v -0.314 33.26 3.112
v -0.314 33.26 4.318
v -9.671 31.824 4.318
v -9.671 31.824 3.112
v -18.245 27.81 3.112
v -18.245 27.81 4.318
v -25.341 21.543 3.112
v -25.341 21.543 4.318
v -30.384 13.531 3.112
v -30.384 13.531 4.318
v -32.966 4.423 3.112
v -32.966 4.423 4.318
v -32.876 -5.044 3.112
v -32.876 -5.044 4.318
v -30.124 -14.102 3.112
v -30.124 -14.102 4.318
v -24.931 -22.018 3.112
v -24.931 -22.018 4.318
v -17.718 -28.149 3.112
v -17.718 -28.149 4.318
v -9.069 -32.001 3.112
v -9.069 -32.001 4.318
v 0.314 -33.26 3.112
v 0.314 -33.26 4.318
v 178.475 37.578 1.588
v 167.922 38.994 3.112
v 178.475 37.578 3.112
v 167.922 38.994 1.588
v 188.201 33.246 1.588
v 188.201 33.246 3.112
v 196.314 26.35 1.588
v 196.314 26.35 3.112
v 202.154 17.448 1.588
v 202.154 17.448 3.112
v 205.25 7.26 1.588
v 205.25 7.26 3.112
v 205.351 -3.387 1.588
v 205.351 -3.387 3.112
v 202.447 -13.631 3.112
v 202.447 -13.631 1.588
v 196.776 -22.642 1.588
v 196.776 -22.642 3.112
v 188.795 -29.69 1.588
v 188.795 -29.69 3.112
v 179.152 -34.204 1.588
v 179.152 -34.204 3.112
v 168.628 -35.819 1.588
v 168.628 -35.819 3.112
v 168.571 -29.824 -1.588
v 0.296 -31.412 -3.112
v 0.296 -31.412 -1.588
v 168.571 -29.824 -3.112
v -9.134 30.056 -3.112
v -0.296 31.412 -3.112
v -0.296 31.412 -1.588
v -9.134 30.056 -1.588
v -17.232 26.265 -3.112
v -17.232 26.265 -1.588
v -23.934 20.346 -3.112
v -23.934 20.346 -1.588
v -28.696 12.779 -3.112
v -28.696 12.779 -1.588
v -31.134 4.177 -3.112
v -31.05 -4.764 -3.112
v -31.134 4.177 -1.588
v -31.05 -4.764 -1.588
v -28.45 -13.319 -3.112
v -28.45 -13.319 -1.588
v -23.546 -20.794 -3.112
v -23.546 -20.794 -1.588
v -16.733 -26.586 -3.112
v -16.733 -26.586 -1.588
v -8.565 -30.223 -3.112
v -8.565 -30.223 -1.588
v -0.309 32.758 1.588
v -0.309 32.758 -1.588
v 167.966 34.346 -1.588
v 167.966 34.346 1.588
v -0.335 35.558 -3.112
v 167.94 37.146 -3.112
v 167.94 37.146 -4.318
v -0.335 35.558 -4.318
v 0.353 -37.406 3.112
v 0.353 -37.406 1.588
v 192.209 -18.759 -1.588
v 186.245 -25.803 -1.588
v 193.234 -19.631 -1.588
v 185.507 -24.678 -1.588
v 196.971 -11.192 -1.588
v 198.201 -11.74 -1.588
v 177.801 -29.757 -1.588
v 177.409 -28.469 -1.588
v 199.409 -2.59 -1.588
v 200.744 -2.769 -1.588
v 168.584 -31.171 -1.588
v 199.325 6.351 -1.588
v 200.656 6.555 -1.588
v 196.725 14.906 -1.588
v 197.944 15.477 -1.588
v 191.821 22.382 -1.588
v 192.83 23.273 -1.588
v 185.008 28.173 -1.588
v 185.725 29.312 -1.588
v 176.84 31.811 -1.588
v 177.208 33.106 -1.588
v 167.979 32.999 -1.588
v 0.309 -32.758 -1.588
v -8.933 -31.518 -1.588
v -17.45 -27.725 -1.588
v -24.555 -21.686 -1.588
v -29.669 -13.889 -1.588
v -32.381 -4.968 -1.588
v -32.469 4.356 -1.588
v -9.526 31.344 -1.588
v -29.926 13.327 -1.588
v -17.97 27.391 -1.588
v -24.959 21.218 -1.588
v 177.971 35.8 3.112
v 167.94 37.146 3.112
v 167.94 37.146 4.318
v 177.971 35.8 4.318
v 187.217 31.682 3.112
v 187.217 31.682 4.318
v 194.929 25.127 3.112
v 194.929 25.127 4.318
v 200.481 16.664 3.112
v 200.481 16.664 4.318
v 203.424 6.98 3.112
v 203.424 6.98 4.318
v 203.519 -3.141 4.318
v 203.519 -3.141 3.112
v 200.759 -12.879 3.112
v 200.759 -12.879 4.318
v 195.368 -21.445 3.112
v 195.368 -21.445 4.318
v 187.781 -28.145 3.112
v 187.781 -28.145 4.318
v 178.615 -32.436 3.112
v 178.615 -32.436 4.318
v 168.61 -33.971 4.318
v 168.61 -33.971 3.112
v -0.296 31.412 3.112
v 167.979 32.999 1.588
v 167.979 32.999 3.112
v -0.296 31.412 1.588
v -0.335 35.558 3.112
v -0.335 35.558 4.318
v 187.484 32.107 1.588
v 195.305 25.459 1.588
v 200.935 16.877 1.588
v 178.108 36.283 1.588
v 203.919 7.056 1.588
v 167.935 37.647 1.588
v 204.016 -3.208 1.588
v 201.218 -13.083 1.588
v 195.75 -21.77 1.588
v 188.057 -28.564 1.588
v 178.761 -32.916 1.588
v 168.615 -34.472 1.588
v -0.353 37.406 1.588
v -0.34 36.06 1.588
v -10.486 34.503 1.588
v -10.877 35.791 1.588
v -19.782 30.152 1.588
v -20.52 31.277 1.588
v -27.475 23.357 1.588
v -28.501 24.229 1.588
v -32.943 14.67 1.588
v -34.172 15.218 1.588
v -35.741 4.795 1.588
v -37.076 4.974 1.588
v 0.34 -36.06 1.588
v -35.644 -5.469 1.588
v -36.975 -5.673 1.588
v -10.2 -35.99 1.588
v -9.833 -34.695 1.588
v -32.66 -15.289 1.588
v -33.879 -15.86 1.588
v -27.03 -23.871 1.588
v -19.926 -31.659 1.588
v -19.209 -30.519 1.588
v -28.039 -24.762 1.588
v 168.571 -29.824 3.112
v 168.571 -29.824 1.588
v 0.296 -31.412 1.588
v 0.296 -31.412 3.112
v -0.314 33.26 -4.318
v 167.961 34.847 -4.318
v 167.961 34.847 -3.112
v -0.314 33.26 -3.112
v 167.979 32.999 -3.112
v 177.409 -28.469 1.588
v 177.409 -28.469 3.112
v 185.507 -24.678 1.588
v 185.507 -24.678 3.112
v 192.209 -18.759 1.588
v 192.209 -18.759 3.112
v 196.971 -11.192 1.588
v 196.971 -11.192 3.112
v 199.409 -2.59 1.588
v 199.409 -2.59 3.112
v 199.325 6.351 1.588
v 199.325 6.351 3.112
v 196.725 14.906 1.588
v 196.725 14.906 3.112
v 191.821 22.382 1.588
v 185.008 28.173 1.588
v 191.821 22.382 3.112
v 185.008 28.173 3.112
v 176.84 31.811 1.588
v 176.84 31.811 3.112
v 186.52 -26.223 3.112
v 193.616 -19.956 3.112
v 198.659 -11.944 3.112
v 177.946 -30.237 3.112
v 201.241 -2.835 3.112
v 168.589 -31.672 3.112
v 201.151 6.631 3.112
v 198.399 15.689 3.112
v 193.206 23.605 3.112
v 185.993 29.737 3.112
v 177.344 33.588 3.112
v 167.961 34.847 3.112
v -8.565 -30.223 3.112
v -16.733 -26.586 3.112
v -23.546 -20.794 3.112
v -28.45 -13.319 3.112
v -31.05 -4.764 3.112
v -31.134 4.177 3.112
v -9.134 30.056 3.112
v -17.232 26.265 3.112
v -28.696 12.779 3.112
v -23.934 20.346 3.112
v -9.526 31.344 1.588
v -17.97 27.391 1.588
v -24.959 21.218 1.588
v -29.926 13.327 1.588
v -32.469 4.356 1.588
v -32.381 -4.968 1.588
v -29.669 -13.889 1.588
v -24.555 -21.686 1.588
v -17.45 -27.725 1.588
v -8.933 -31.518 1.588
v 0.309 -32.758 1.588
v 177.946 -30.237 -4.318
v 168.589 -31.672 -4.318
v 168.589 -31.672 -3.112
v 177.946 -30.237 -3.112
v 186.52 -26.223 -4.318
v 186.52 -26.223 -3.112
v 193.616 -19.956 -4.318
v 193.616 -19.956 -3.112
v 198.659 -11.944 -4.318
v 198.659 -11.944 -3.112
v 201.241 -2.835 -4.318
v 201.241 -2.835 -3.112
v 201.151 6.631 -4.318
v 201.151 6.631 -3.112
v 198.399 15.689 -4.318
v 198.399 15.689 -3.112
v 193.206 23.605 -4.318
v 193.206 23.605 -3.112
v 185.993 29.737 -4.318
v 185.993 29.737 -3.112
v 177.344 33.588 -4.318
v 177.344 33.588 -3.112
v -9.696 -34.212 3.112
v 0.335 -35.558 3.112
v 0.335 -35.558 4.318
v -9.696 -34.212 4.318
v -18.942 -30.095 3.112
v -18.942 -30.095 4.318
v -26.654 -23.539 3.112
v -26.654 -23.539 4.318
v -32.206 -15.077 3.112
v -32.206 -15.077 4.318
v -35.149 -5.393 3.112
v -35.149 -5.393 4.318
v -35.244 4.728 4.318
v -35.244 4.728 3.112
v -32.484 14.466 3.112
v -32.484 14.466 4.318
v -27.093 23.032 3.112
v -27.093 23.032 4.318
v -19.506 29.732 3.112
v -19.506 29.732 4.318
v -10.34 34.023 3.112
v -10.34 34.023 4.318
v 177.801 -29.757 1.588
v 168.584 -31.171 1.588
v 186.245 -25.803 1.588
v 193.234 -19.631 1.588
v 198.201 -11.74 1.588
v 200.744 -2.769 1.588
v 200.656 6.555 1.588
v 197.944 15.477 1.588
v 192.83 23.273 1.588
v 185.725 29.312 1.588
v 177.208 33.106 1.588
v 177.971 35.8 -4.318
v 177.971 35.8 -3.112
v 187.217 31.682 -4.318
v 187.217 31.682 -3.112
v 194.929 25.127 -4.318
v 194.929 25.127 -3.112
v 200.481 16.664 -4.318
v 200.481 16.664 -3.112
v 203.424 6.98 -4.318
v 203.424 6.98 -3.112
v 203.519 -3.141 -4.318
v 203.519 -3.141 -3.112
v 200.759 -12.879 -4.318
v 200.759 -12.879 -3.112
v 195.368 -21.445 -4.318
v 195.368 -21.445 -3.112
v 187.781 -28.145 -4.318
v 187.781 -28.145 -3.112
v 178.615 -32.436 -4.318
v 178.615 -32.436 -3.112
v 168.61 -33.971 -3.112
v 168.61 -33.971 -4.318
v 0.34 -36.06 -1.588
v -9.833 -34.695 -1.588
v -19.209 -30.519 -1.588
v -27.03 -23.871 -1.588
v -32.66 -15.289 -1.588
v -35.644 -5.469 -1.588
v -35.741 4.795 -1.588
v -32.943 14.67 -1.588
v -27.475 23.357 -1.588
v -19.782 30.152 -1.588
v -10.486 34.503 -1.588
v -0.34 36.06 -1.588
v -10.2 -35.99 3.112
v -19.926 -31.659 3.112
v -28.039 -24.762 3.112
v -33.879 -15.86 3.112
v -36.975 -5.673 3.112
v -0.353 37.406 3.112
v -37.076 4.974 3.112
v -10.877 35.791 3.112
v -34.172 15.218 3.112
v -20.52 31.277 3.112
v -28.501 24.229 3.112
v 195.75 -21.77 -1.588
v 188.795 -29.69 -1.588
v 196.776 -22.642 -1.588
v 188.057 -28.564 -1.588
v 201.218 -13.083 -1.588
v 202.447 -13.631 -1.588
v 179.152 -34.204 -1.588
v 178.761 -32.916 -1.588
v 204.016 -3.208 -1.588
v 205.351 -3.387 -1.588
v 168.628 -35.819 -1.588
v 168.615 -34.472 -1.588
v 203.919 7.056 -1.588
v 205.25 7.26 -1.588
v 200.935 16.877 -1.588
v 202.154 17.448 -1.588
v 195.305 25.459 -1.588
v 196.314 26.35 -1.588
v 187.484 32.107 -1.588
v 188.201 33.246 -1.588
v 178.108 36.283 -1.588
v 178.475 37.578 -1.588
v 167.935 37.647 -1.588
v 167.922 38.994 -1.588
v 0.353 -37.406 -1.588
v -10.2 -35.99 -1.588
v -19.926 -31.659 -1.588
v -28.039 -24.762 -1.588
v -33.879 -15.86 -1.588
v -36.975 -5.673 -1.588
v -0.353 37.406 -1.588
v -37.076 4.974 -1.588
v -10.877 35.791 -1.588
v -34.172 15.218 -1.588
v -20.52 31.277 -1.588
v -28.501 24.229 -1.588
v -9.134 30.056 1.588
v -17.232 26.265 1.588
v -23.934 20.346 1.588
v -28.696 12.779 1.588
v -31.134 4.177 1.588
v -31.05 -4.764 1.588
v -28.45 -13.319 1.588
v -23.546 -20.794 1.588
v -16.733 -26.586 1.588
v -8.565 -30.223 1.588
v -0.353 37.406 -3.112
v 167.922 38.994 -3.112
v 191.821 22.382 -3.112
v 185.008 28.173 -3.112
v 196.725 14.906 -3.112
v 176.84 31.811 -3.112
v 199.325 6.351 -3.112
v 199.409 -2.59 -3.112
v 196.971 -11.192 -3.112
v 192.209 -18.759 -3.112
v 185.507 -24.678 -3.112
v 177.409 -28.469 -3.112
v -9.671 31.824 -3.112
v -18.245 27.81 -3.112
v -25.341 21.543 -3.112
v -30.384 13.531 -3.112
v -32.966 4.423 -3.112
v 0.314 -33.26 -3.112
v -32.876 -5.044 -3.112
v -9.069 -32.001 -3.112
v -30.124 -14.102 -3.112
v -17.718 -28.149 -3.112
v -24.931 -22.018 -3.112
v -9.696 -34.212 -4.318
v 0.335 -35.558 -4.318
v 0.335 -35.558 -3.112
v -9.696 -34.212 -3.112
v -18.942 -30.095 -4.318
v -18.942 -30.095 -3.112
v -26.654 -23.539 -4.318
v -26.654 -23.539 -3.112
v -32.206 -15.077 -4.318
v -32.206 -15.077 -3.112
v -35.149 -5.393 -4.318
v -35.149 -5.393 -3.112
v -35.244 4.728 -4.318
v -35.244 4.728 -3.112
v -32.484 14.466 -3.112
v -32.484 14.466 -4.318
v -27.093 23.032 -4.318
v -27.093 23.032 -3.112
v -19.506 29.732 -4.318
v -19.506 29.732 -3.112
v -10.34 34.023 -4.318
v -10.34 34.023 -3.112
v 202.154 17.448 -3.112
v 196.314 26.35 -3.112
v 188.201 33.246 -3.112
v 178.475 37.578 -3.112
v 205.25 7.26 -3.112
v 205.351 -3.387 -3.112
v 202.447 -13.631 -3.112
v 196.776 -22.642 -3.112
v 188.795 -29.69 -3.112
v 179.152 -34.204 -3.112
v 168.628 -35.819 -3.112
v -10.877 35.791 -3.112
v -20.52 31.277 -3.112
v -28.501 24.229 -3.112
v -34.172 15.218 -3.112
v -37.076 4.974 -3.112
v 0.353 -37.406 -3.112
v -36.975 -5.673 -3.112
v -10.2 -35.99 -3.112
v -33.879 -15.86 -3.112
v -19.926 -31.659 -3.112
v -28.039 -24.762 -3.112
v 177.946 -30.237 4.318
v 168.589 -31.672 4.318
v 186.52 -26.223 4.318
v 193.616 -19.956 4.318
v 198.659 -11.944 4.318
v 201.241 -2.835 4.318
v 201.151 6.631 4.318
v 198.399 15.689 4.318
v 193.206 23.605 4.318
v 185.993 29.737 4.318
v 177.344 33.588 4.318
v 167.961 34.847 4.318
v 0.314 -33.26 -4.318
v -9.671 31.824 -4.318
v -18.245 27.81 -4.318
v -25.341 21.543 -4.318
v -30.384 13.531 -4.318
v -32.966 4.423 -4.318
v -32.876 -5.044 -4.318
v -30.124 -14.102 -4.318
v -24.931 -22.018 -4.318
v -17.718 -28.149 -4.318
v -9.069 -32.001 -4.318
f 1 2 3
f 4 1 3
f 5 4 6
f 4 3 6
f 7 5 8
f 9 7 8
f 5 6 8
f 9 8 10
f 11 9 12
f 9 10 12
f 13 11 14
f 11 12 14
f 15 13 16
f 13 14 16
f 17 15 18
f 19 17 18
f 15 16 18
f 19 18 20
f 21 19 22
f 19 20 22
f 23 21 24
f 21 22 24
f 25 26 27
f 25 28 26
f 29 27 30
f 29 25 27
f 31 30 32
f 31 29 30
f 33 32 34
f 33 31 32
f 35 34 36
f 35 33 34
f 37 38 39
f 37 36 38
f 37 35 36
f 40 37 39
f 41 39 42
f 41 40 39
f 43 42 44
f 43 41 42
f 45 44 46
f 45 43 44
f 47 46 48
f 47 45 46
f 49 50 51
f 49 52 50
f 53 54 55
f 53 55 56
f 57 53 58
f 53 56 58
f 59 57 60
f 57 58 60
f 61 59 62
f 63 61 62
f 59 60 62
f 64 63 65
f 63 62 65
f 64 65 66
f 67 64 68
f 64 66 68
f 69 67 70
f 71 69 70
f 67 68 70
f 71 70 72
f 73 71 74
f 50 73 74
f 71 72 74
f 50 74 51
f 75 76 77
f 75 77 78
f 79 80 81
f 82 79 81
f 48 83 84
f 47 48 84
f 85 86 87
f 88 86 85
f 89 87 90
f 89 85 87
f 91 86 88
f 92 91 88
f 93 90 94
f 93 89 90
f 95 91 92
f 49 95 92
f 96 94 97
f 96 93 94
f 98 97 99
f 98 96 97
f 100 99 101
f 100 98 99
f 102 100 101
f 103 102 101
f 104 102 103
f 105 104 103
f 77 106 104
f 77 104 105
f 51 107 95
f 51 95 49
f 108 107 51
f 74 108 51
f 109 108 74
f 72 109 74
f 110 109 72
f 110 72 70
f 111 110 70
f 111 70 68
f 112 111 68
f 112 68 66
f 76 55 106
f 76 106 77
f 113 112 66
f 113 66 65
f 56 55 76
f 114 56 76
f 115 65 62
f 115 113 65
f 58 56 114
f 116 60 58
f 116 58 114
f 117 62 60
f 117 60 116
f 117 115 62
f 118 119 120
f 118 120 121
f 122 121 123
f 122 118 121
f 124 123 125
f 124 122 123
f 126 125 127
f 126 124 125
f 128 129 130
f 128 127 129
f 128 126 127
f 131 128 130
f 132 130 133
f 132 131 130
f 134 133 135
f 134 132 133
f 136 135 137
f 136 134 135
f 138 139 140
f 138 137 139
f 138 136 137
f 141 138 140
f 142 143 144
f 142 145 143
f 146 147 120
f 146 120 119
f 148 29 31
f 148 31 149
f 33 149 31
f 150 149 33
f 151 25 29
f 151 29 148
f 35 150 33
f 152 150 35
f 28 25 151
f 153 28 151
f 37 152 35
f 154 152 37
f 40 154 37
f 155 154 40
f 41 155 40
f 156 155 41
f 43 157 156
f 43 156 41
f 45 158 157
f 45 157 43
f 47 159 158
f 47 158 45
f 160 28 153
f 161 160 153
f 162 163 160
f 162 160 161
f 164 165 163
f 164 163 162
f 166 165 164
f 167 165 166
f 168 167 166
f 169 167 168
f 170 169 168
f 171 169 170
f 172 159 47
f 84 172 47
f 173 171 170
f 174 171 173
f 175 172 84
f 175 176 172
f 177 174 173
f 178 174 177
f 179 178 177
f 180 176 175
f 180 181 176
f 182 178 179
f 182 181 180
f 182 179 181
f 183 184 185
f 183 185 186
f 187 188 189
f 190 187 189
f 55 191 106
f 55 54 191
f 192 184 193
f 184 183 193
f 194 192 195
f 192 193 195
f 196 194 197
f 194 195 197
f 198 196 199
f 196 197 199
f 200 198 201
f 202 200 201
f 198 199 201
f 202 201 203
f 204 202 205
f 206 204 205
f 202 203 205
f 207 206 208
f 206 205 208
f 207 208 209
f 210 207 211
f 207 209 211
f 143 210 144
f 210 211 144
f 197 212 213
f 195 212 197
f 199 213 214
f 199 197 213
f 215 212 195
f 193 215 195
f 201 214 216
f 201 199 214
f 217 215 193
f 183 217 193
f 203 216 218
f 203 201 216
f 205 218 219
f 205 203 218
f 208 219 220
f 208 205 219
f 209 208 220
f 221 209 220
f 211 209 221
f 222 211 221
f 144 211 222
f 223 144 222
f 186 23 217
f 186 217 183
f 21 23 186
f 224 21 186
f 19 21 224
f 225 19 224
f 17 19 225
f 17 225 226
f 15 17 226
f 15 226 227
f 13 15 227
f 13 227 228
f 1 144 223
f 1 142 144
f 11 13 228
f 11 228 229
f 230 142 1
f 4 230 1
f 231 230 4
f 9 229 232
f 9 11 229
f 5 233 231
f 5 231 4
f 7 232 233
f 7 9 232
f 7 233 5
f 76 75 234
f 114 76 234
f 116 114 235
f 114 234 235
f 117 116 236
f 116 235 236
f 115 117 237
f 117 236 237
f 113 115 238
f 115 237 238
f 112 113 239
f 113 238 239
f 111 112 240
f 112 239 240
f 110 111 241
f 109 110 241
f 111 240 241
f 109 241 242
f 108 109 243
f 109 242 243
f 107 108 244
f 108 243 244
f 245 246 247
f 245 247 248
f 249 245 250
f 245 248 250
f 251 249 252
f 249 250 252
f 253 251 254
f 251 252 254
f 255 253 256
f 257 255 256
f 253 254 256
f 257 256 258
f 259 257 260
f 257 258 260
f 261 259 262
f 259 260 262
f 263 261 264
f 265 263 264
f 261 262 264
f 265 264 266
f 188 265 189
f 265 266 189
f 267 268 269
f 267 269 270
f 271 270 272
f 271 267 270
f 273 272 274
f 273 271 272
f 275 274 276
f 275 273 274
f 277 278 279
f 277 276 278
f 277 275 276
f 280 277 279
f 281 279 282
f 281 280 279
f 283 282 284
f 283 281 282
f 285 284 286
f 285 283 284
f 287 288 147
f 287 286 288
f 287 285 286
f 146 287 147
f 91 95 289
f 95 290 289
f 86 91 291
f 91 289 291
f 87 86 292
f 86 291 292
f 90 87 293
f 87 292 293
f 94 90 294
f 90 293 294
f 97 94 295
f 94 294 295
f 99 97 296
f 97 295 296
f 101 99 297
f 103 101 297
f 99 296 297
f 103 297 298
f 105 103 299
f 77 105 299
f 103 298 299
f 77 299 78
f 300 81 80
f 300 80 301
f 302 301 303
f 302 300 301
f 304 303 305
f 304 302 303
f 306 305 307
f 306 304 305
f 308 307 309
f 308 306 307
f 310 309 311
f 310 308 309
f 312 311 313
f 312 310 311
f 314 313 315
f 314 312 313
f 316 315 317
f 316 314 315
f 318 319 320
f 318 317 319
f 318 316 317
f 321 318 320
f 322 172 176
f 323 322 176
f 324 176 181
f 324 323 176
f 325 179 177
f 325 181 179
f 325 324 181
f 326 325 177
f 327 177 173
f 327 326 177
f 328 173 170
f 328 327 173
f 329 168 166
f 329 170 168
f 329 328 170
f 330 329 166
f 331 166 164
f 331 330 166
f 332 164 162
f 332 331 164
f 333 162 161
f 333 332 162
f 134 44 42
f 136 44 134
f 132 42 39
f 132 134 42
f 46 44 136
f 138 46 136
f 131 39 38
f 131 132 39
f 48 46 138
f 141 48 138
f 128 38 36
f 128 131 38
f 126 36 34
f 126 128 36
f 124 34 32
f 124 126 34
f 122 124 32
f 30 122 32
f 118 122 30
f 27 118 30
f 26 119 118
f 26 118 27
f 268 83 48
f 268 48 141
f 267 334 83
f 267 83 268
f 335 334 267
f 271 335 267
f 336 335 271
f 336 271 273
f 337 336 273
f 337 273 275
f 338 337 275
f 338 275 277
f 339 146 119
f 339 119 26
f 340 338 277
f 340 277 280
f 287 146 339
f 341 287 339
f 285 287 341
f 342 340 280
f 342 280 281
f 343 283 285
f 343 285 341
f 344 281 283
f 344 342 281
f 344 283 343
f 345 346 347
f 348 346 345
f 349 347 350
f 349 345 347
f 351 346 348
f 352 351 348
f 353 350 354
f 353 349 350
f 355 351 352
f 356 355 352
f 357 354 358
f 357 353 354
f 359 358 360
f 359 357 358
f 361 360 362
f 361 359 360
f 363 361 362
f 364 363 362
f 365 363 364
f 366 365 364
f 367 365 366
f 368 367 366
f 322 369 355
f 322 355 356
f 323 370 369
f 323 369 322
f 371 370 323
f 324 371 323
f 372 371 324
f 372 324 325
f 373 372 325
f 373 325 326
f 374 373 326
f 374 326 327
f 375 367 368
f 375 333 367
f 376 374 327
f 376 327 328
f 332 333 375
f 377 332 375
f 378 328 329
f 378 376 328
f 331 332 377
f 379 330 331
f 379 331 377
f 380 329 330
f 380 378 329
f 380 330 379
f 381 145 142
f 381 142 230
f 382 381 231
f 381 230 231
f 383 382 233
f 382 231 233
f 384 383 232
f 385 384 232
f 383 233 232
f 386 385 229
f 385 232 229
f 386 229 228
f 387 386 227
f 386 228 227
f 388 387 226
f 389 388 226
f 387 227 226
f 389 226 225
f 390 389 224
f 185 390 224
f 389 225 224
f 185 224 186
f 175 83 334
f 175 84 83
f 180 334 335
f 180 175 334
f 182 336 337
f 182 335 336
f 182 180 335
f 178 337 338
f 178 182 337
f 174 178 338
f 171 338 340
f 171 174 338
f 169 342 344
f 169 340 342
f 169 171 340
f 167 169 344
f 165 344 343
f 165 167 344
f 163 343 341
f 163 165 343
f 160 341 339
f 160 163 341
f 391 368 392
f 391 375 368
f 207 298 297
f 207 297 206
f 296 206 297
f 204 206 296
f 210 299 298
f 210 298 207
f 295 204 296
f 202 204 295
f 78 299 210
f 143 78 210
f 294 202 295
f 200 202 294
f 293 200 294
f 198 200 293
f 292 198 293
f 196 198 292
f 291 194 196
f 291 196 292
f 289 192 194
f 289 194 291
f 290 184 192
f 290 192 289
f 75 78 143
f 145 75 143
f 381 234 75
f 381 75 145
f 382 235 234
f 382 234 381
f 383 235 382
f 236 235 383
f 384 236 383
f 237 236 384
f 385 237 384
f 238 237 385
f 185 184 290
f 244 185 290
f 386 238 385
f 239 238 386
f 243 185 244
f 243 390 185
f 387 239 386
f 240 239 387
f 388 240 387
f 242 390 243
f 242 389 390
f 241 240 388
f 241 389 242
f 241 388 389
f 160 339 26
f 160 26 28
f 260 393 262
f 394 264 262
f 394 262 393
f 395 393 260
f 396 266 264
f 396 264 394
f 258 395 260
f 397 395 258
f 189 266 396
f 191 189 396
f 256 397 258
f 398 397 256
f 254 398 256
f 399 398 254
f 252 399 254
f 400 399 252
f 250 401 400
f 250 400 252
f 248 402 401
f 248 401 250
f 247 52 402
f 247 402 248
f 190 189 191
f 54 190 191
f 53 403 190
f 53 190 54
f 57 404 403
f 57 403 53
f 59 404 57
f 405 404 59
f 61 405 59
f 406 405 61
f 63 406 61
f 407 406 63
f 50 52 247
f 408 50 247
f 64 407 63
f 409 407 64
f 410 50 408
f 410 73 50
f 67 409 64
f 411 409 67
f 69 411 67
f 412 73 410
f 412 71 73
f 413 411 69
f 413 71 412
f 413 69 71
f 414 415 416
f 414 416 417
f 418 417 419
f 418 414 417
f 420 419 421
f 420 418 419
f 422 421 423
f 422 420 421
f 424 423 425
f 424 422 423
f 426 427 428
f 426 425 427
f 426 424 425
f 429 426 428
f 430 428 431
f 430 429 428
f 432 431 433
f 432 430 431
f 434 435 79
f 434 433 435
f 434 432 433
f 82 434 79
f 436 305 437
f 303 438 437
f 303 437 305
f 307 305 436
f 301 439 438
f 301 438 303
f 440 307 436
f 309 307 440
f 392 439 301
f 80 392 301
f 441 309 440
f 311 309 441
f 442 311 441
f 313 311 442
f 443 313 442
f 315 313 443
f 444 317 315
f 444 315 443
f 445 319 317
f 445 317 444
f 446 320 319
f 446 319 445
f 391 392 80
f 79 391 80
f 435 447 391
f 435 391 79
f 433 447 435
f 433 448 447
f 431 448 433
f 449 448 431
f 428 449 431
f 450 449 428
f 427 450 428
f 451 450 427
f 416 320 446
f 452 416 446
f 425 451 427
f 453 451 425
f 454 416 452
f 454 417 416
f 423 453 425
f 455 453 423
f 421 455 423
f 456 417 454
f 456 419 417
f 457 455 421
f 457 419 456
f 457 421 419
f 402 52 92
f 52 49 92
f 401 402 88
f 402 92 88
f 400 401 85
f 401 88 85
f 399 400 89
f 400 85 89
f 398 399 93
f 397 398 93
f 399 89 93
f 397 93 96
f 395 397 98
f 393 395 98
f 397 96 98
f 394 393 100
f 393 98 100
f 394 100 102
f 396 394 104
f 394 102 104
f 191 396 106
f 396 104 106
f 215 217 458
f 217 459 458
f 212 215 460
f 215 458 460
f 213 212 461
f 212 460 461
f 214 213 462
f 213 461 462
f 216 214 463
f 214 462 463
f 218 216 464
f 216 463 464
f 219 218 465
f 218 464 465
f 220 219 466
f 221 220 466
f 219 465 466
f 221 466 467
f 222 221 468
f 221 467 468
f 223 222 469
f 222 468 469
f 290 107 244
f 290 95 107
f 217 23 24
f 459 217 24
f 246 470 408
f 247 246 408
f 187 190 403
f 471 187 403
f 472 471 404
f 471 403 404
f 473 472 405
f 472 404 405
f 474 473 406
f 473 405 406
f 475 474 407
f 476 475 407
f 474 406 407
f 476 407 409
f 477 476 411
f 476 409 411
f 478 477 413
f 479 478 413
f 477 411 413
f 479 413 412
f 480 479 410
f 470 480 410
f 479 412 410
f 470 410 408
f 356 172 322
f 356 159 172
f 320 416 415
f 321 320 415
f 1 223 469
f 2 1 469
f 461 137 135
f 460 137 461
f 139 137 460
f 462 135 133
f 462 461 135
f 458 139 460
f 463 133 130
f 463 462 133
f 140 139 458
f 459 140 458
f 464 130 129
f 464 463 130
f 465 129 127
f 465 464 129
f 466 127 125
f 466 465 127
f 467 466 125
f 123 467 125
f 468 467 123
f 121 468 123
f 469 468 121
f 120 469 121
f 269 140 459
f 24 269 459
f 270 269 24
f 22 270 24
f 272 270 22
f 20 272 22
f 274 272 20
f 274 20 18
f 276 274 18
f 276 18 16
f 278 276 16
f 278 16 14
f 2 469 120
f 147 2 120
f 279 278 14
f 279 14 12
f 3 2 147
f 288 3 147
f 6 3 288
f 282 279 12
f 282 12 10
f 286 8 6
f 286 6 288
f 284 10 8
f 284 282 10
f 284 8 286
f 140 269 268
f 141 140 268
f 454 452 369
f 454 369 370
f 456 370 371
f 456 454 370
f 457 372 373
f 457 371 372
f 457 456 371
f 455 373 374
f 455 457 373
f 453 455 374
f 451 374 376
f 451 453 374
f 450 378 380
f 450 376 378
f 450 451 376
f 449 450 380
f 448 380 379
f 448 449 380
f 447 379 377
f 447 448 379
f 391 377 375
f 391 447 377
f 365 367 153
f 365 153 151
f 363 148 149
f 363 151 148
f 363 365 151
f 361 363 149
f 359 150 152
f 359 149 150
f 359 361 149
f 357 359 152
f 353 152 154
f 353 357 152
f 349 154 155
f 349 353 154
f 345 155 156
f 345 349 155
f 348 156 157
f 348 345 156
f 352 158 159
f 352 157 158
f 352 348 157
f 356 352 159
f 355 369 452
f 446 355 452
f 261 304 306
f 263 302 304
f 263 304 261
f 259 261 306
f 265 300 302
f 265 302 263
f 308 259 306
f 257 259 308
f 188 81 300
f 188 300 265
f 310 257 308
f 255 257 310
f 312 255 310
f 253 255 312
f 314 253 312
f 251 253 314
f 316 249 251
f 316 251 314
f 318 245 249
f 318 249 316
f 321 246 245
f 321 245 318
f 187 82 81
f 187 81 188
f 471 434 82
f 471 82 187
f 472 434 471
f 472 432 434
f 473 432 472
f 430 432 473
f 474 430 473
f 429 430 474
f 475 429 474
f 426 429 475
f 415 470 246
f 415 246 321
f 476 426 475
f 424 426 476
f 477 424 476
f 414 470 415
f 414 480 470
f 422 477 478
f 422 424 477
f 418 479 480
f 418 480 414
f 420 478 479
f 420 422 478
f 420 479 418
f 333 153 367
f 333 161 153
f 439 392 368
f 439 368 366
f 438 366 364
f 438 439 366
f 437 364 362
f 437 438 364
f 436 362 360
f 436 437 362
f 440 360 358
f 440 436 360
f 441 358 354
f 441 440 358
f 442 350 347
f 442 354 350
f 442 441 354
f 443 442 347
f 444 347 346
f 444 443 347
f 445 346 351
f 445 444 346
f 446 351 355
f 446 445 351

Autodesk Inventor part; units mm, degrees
ref_plane "Work Plane2" through (0, 0, 0) normal (-1, 0, 0) x (0, 0, 1)
ref_plane "Work Plane3" through (168.275, 1.5875, 0) normal (-0.9957572, 0.0920191, 0) x (0, 0, 1)
sketch "Path" plane through (0, 0, 0) normal (0, 0, 1) x (1, 0, 0)
  arc A0 (-0.3246, 34.409) -> (0.3246, -34.409) centre (0, 0) ccw
  arc A1 (168.5996, -32.8215) -> (167.9504, 35.9965) centre (168.275, 1.5875) ccw
  line L0 (168.5996, -32.8215) -> (0.3246, -34.409)
  line L1 (-0.3246, 34.409) -> (167.9504, 35.9965)
  dimension "d31" = 5.9944
ref_plane "Section Plane" through (0.3246, -34.409, 0) normal (0.9999555, 0.0094335, 0) x (0, 0, 1)
sketch "Section Sketch" plane through (0.3246, -34.409, 0) normal (0.9999555, 0.0094335, 0) x (0, 0, 1)
  line L0 (-4.318, -1.1494) -> (4.318, -1.1494)
  line L1 (4.318, -1.1494) -> (4.318, 1.1494)
  line L2 (4.318, 1.1494) -> (-4.318, 1.1494)
  line L3 (-4.318, 1.1494) -> (-4.318, -1.1494)
  line L4 (-1.5875, -1.651) -> (1.5875, -1.651)
  line L5 (1.5875, -1.651) -> (1.5875, 1.651)
  line L6 (1.5875, 1.651) -> (-1.5875, 1.651)
  line L7 (-1.5875, 1.651) -> (-1.5875, -1.651)
  line L8 (-1.5875, 0) -> (1.5875, 0) construction
  line L9 (-3.1115, -2.9972) -> (-1.5875, -2.9972)
  line L10 (-1.5875, -2.9972) -> (-1.5875, 2.9972)
  line L11 (-1.5875, 2.9972) -> (-3.1115, 2.9972)
  line L12 (-3.1115, 2.9972) -> (-3.1115, -2.9972)
  line L13 (1.5875, -2.9972) -> (3.1115, -2.9972)
  line L14 (3.1115, -2.9972) -> (3.1115, 2.9972)
  line L15 (3.1115, 2.9972) -> (1.5875, 2.9972)
  line L16 (1.5875, 2.9972) -> (1.5875, -2.9972)
  line L17 (-4.318, 0) -> (4.318, 0) construction
  point P0 (0, 0)
  point P1 (0, 0)
  dimension "d21" = 2.2987
  dimension "d22" = 3.302
  dimension "d23" = 3.175
  dimension "d24" = 1.524
  dimension "d31" = 5.9944
  dimension "d32" = 8.636
sweep "Solid" add profiles "Section Sketch" path "Path"
pattern_of_one "Strand Pattern"
equation "\"d21\" = da_d2"
equation "\"d22\" = da_d1"
equation "\"d23\" = da_b1"
equation "\"d24\" = da_t1 + da_t2"
equation "\"d30\" = da_pt"
equation "\"da_p\" = 6.35"
equation "\"da_b1\" = 3.175"
equation "\"da_h2\" = 5.9944"
equation "\"da_h3\" = 5.207"
equation "\"da_d1\" = 3.302"
equation "\"da_d2\" = 2.2987"
equation "\"da_pt\" = 6.4008"
equation "\"da_b\" = 8.636"
equation "\"da_t1\" = 0.762"
equation "\"da_t2\" = 0.762"
properties part number "Roller Chain" material "Stainless Steel, 440C"
